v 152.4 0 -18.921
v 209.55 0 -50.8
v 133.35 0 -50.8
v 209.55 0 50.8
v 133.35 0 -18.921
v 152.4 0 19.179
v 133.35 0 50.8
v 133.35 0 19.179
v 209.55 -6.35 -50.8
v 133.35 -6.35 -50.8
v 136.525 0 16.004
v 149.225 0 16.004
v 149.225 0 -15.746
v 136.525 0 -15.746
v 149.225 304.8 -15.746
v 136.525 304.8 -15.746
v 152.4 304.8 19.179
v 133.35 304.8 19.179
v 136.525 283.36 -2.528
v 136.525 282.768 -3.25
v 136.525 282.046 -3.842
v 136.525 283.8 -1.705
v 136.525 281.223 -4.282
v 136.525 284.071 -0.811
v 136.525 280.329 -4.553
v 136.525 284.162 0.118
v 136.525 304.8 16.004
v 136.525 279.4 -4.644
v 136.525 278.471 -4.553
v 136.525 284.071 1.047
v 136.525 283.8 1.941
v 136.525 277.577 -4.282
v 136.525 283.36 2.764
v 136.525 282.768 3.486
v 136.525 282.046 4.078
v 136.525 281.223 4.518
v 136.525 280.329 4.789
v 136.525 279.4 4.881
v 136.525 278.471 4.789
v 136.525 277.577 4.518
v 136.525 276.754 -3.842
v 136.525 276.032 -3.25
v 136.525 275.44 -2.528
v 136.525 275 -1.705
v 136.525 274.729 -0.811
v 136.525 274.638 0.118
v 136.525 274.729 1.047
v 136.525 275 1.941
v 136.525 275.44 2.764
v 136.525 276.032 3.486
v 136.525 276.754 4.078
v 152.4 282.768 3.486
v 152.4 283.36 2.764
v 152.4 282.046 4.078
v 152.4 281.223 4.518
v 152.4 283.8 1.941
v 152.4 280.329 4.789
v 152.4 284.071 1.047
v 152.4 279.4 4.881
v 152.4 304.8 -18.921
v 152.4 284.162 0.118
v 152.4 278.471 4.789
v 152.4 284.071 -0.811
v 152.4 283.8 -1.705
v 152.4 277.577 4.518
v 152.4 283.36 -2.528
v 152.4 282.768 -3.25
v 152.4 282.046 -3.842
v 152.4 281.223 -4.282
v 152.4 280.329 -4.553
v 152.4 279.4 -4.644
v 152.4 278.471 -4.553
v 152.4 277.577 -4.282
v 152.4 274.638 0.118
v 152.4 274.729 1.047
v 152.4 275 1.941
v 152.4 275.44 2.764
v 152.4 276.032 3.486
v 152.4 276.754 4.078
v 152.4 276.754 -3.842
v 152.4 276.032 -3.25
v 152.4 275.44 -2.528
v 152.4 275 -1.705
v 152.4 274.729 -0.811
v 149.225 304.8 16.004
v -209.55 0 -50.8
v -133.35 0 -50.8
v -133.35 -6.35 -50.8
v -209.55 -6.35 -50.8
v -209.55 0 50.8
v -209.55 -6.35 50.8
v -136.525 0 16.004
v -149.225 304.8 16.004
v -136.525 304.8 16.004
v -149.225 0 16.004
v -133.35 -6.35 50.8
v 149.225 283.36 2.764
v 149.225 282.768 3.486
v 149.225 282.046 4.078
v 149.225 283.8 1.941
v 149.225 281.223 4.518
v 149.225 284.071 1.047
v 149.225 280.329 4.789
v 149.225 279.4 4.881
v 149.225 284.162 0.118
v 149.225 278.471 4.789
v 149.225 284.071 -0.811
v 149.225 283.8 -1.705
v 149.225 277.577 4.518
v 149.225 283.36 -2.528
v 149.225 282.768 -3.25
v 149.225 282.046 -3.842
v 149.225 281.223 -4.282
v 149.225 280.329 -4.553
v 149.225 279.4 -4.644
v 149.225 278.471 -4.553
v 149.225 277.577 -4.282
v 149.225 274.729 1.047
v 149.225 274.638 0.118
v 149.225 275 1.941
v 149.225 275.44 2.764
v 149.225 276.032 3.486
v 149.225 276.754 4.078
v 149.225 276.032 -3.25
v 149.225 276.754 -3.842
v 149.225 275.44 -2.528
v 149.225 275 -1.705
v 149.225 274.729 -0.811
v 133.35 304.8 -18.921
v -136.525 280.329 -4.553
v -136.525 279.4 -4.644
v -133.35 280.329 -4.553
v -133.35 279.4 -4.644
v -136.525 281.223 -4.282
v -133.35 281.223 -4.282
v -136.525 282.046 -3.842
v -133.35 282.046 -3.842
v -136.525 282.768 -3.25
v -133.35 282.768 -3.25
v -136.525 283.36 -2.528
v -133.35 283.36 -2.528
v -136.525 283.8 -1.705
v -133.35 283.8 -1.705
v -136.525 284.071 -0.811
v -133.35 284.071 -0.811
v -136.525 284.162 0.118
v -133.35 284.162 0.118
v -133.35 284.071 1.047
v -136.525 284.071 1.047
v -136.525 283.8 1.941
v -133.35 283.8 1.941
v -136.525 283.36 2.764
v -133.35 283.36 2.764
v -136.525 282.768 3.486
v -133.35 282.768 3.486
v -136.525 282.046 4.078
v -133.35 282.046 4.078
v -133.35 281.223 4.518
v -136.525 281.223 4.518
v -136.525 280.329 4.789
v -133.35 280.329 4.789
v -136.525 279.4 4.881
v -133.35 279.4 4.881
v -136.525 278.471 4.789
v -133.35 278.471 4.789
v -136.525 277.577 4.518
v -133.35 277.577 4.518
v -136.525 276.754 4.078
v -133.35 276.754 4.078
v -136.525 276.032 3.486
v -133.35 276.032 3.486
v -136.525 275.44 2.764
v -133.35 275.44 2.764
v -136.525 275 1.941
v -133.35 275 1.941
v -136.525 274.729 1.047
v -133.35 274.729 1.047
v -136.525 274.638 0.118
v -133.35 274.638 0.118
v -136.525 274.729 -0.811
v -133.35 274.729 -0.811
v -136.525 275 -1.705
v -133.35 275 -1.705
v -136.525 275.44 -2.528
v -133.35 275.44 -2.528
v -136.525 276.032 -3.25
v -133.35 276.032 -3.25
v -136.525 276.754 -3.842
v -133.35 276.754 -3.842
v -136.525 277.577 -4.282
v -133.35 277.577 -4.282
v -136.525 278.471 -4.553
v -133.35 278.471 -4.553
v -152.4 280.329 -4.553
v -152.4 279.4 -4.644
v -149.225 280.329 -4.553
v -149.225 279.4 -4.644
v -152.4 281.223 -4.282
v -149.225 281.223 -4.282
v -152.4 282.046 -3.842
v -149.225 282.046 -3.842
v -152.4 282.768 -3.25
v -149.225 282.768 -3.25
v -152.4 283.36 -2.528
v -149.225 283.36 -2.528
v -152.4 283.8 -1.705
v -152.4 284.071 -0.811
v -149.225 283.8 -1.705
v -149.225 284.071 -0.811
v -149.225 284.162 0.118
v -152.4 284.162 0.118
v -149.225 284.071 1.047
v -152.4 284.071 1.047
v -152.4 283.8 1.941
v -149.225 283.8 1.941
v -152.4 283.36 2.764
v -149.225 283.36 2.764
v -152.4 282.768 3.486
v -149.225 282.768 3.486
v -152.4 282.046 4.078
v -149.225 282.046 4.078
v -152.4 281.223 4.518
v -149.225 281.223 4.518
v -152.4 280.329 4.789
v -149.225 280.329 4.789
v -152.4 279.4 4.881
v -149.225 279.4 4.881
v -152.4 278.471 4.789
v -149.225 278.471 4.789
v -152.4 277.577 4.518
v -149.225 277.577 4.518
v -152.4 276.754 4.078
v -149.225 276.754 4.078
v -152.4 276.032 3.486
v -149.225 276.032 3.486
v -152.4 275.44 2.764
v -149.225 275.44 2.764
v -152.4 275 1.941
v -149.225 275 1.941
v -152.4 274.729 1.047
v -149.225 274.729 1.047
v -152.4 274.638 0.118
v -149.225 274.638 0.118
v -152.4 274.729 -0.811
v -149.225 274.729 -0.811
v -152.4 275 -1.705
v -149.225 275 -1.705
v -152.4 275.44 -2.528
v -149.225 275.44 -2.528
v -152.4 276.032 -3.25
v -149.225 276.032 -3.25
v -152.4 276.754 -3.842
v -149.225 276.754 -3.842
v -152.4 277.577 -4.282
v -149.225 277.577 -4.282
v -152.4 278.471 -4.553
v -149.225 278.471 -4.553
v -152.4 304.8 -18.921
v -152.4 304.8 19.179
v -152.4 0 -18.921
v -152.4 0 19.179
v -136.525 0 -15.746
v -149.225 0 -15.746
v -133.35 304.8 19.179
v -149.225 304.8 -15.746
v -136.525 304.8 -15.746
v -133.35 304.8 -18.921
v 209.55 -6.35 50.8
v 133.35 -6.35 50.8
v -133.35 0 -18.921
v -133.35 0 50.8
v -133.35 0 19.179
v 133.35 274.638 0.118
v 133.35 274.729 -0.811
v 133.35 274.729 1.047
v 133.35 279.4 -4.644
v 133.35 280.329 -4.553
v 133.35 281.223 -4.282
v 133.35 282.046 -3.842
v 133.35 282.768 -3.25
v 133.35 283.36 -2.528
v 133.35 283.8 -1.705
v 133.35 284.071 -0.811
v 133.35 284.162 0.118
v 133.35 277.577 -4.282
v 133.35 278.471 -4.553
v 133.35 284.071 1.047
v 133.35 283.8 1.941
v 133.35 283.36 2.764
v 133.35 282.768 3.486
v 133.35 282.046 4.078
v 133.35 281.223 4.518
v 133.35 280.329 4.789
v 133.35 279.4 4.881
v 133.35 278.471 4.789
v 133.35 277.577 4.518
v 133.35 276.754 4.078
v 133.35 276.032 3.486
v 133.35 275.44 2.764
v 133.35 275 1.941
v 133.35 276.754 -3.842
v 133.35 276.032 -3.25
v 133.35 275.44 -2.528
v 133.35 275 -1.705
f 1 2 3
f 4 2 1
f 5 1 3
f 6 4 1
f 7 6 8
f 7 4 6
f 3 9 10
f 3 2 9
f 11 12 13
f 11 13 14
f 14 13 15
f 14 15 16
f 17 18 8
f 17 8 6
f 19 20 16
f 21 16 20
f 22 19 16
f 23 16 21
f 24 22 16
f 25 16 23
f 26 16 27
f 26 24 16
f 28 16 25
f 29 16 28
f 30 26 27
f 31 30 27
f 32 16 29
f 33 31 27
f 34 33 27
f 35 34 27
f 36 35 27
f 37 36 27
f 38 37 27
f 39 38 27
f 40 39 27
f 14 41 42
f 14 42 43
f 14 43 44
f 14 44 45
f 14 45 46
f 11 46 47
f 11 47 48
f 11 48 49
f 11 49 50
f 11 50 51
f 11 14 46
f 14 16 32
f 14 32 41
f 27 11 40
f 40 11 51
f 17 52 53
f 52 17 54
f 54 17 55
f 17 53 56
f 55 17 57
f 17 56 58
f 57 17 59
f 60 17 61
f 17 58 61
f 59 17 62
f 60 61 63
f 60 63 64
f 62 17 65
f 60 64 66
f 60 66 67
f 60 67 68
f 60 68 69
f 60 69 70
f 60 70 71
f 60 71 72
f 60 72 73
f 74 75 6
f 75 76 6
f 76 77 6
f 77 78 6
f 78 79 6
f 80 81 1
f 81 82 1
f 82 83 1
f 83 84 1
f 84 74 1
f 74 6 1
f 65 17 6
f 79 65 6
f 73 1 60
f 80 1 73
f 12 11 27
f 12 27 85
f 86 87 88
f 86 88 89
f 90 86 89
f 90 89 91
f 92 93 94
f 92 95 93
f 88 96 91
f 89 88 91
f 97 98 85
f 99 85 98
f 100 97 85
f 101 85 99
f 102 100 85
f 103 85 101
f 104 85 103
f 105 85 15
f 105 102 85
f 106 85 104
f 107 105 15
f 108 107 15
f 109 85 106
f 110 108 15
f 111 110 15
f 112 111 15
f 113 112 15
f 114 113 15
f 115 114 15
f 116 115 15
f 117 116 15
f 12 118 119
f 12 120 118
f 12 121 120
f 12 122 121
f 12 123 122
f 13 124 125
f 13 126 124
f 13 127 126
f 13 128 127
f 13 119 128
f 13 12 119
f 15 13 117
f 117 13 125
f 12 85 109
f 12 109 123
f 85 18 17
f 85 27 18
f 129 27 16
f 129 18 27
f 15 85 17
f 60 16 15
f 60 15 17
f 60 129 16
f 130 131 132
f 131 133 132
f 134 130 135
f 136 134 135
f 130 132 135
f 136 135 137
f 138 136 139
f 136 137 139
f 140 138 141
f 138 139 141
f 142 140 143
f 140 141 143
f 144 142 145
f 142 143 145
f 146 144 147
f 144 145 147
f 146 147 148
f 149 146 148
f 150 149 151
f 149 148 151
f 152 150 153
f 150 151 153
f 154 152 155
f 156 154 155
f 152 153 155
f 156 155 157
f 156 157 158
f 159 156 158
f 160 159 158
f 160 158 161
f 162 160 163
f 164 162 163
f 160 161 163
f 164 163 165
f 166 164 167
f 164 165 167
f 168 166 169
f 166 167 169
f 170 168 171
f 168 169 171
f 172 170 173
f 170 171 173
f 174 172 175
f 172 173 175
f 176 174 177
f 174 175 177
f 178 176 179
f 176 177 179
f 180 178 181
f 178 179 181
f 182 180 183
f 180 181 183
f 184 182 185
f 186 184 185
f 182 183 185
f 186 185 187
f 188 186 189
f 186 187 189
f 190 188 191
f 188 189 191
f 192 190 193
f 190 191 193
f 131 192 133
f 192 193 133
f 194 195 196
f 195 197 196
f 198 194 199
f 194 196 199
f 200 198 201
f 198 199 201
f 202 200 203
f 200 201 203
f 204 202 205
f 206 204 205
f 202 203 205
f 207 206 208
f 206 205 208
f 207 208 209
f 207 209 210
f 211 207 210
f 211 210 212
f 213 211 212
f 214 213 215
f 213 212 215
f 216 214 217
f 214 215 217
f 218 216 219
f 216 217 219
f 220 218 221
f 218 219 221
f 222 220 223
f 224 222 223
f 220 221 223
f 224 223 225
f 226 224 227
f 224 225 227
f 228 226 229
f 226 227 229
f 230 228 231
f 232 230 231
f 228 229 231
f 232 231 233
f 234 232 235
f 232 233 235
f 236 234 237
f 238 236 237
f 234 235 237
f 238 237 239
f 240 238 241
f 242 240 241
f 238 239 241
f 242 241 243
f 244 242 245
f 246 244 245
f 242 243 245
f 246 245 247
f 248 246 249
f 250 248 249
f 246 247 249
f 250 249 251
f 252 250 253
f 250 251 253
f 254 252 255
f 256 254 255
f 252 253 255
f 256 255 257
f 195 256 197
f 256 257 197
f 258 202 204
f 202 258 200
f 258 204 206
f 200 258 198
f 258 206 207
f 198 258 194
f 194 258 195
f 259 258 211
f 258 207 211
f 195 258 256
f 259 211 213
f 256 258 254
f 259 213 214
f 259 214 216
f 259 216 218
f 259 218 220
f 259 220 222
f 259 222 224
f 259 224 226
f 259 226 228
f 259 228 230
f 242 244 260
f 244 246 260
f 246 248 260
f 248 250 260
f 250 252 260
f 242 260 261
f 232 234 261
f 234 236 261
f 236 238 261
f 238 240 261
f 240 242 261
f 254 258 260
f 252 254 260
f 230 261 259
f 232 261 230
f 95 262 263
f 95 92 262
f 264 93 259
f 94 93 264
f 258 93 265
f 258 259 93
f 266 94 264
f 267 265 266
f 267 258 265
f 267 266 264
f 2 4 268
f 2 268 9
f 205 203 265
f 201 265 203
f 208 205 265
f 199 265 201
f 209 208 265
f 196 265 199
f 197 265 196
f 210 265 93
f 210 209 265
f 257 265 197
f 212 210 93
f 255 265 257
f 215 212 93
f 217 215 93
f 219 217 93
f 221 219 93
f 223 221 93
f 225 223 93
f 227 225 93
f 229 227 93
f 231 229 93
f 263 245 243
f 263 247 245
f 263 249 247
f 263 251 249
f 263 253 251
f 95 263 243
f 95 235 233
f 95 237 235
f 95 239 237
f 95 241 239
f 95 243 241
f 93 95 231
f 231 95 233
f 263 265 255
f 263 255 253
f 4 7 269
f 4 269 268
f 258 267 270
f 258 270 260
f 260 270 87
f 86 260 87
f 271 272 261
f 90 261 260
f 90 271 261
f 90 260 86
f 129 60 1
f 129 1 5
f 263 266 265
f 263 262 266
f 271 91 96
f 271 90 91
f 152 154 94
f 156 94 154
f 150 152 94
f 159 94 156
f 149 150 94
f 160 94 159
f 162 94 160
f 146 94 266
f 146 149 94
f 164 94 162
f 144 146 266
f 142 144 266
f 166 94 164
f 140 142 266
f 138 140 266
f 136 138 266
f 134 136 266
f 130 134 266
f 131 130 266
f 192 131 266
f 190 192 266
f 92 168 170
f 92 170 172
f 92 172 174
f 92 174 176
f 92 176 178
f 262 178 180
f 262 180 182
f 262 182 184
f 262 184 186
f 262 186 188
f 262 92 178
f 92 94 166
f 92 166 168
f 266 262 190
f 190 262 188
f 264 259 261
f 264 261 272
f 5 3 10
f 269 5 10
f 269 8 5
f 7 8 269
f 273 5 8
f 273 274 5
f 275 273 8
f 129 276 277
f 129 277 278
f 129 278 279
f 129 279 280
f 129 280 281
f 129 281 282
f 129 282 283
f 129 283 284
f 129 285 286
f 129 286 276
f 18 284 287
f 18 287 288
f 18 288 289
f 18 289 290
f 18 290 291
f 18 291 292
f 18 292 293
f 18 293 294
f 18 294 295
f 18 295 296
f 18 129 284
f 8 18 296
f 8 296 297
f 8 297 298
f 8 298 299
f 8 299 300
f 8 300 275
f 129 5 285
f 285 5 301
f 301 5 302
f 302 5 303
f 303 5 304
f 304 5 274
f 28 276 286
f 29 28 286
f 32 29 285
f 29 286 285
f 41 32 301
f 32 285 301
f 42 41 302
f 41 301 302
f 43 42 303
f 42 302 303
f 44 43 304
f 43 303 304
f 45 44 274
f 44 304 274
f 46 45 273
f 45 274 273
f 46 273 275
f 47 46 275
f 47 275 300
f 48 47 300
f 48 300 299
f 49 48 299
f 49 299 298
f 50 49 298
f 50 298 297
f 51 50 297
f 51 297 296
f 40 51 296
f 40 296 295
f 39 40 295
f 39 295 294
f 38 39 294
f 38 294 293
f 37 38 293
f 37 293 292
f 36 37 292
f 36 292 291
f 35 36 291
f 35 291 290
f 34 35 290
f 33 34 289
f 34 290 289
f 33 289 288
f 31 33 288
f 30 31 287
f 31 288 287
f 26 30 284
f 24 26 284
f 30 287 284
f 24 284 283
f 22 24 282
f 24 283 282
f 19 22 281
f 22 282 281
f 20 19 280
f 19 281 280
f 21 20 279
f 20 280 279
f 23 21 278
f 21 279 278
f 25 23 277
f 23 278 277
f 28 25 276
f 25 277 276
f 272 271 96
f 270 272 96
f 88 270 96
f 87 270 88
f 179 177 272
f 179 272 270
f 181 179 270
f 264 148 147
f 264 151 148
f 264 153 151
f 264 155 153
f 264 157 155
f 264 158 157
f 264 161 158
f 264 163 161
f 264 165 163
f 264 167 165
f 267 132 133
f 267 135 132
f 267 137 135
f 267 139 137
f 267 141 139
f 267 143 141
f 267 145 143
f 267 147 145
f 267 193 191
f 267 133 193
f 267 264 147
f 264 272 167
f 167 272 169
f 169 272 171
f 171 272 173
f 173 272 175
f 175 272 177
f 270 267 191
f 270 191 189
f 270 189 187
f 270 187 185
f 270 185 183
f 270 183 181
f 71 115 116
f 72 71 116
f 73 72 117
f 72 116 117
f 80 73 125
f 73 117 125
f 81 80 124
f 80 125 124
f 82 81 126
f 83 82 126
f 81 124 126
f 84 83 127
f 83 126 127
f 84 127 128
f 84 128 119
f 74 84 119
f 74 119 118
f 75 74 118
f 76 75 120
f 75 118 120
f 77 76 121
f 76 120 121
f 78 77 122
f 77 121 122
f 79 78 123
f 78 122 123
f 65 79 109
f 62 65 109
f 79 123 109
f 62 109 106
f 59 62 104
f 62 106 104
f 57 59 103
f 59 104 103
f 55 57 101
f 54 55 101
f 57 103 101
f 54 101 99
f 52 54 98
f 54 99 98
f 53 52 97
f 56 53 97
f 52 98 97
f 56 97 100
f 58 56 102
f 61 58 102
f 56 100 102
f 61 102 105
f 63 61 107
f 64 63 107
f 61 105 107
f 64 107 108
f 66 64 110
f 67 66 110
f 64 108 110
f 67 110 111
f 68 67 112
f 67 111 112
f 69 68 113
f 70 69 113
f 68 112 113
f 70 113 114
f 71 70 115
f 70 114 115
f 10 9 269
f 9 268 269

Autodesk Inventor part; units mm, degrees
ref_plane "YZ Plane" through (0, 0, 0) normal (1, 0, 0) x (0, 1, 0)
ref_plane "XZ Plane" through (0, 0, 0) normal (0, 1, 0) x (-1, 0, 0)
ref_plane "XY Plane" through (0, 0, 0) normal (0, 0, 1) x (1, 0, 0)
sketch "Sketch6" plane through (0, 0, 0) normal (0, 1, 0) x (-1, 0, 0)
  line L0 (209.55, 50.8) -> (133.35, 50.8)
  line L1 (133.35, 50.8) -> (133.35, -50.8)
  line L2 (133.35, -50.8) -> (209.55, -50.8)
  line L3 (209.55, -50.8) -> (209.55, 50.8)
  line L4 (209.55, 50.8) -> (133.35, -50.8) construction
  line L5 (133.35, 50.8) -> (209.55, -50.8) construction
  point P0 (0, 0)
  point P1 (171.45, 0)
  dimension "d19" = 101.6
  dimension "d20" = 76.2
  dimension "d21" = 209.55
extrude "Extrusion5" add sketch "Sketch6" against normal blind 6.35
sketch "Sketch7" plane through (0, 0, 0) normal (0, 1, 0) x (1, 0, 0)
  line L0 (-152.4, -19.1787) -> (-133.35, -19.1787)
  line L1 (-133.35, -19.1787) -> (-133.35, 18.9213)
  line L2 (-133.35, 18.9213) -> (-152.4, 18.9213)
  line L3 (-152.4, 18.9213) -> (-152.4, -19.1787)
  line L4 (-152.4, -19.1787) -> (-133.35, 18.9213) construction
  line L5 (-133.35, -19.1787) -> (-152.4, 18.9213) construction
  line L6 (-149.225, -16.0037) -> (-136.525, -16.0037)
  line L7 (-136.525, -16.0037) -> (-136.525, 15.7463)
  line L8 (-136.525, 15.7463) -> (-149.225, 15.7463)
  line L9 (-149.225, 15.7463) -> (-149.225, -16.0037)
  line L10 (-149.225, -16.0037) -> (-136.525, 15.7463) construction
  line L11 (-136.525, -16.0037) -> (-149.225, 15.7463) construction
  line L12 (-133.35, -50.8) -> (-133.35, 50.8) projected
  point P0 (0, 0)
  point P1 (-142.875, -0.1287)
  dimension "d24" = 19.05
  dimension "d25" = 38.1
  dimension "d26" = 3.175
  dimension "d27" = 3.175
extrude "Extrusion6" add sketch "Sketch7" along normal blind 304.8
sketch "Sketch8" plane through (-133.35, -6.35, 50.8) normal (1, 0, 0) x (0, 0, -1)
  line L0 (50.8, 6.35) -> (50.6713, 311.15) construction
  line L1 (34.7963, 311.15) -> (66.5463, 311.15) construction
  circle A0 centre (50.682, 285.75) radius 4.7625
  line L2 (101.6, 6.35) -> (0, 6.35) projected
  dimension "d30" = 9.525
  dimension "d31" = 279.4
extrude "Extrusion7" cut sketch "Sketch8" against normal through all
mirror "Mirror1" about plane through (0, 0, 0) normal (1, 0, 0) of "Extrusion6", "Extrusion7", "Extrusion5"
equation "\"d19\" = BaseLength"
equation "\"d20\" = baseForArmWidth"
equation "\"d21\" = 0.5 * robotBaseWidth"
equation "\"d22\" = BaseThickness"
equation "\"d24\" = postWidth"
equation "\"d25\" = postLength"
equation "\"d26\" = postThickness"
equation "\"d27\" = postThickness"
equation "\"d28\" = postHeight"
equation "\"d30\" = axelDiam"
equation "\"d31\" = axelHeightAbovePlate"
equation "\"d32\" = postHeight"
equation "\"BaseWidth\" = 95.25"
equation "\"BaseLength\" = 101.6"
equation "\"BaseThickness\" = 6.35"
equation "\"postWidth\" = 19.05"
equation "\"postLength\" = 38.1"
equation "\"postThickness\" = 3.175"
equation "\"postCenterDistanceFromCenterOfBase\" = 38.1"
equation "\"postHeight\" = 304.8"
equation "\"axelDiam\" = 9.525"
equation "\"baseForArmWidth\" = 76.2"
equation "\"robotBaseWidth\" = 419.1"
equation "\"telescopeArmWidth\" = 44.45"
equation "\"postToSupportArmAxelDistanceFromCenter\" = 0.5 * robotBaseWidth - baseForArmWidth"
equation "\"axelHeightAbovePlate\" = 279.4"
properties part number "RearPostForLiftWith2Posts" material "Aluminum 6061"
